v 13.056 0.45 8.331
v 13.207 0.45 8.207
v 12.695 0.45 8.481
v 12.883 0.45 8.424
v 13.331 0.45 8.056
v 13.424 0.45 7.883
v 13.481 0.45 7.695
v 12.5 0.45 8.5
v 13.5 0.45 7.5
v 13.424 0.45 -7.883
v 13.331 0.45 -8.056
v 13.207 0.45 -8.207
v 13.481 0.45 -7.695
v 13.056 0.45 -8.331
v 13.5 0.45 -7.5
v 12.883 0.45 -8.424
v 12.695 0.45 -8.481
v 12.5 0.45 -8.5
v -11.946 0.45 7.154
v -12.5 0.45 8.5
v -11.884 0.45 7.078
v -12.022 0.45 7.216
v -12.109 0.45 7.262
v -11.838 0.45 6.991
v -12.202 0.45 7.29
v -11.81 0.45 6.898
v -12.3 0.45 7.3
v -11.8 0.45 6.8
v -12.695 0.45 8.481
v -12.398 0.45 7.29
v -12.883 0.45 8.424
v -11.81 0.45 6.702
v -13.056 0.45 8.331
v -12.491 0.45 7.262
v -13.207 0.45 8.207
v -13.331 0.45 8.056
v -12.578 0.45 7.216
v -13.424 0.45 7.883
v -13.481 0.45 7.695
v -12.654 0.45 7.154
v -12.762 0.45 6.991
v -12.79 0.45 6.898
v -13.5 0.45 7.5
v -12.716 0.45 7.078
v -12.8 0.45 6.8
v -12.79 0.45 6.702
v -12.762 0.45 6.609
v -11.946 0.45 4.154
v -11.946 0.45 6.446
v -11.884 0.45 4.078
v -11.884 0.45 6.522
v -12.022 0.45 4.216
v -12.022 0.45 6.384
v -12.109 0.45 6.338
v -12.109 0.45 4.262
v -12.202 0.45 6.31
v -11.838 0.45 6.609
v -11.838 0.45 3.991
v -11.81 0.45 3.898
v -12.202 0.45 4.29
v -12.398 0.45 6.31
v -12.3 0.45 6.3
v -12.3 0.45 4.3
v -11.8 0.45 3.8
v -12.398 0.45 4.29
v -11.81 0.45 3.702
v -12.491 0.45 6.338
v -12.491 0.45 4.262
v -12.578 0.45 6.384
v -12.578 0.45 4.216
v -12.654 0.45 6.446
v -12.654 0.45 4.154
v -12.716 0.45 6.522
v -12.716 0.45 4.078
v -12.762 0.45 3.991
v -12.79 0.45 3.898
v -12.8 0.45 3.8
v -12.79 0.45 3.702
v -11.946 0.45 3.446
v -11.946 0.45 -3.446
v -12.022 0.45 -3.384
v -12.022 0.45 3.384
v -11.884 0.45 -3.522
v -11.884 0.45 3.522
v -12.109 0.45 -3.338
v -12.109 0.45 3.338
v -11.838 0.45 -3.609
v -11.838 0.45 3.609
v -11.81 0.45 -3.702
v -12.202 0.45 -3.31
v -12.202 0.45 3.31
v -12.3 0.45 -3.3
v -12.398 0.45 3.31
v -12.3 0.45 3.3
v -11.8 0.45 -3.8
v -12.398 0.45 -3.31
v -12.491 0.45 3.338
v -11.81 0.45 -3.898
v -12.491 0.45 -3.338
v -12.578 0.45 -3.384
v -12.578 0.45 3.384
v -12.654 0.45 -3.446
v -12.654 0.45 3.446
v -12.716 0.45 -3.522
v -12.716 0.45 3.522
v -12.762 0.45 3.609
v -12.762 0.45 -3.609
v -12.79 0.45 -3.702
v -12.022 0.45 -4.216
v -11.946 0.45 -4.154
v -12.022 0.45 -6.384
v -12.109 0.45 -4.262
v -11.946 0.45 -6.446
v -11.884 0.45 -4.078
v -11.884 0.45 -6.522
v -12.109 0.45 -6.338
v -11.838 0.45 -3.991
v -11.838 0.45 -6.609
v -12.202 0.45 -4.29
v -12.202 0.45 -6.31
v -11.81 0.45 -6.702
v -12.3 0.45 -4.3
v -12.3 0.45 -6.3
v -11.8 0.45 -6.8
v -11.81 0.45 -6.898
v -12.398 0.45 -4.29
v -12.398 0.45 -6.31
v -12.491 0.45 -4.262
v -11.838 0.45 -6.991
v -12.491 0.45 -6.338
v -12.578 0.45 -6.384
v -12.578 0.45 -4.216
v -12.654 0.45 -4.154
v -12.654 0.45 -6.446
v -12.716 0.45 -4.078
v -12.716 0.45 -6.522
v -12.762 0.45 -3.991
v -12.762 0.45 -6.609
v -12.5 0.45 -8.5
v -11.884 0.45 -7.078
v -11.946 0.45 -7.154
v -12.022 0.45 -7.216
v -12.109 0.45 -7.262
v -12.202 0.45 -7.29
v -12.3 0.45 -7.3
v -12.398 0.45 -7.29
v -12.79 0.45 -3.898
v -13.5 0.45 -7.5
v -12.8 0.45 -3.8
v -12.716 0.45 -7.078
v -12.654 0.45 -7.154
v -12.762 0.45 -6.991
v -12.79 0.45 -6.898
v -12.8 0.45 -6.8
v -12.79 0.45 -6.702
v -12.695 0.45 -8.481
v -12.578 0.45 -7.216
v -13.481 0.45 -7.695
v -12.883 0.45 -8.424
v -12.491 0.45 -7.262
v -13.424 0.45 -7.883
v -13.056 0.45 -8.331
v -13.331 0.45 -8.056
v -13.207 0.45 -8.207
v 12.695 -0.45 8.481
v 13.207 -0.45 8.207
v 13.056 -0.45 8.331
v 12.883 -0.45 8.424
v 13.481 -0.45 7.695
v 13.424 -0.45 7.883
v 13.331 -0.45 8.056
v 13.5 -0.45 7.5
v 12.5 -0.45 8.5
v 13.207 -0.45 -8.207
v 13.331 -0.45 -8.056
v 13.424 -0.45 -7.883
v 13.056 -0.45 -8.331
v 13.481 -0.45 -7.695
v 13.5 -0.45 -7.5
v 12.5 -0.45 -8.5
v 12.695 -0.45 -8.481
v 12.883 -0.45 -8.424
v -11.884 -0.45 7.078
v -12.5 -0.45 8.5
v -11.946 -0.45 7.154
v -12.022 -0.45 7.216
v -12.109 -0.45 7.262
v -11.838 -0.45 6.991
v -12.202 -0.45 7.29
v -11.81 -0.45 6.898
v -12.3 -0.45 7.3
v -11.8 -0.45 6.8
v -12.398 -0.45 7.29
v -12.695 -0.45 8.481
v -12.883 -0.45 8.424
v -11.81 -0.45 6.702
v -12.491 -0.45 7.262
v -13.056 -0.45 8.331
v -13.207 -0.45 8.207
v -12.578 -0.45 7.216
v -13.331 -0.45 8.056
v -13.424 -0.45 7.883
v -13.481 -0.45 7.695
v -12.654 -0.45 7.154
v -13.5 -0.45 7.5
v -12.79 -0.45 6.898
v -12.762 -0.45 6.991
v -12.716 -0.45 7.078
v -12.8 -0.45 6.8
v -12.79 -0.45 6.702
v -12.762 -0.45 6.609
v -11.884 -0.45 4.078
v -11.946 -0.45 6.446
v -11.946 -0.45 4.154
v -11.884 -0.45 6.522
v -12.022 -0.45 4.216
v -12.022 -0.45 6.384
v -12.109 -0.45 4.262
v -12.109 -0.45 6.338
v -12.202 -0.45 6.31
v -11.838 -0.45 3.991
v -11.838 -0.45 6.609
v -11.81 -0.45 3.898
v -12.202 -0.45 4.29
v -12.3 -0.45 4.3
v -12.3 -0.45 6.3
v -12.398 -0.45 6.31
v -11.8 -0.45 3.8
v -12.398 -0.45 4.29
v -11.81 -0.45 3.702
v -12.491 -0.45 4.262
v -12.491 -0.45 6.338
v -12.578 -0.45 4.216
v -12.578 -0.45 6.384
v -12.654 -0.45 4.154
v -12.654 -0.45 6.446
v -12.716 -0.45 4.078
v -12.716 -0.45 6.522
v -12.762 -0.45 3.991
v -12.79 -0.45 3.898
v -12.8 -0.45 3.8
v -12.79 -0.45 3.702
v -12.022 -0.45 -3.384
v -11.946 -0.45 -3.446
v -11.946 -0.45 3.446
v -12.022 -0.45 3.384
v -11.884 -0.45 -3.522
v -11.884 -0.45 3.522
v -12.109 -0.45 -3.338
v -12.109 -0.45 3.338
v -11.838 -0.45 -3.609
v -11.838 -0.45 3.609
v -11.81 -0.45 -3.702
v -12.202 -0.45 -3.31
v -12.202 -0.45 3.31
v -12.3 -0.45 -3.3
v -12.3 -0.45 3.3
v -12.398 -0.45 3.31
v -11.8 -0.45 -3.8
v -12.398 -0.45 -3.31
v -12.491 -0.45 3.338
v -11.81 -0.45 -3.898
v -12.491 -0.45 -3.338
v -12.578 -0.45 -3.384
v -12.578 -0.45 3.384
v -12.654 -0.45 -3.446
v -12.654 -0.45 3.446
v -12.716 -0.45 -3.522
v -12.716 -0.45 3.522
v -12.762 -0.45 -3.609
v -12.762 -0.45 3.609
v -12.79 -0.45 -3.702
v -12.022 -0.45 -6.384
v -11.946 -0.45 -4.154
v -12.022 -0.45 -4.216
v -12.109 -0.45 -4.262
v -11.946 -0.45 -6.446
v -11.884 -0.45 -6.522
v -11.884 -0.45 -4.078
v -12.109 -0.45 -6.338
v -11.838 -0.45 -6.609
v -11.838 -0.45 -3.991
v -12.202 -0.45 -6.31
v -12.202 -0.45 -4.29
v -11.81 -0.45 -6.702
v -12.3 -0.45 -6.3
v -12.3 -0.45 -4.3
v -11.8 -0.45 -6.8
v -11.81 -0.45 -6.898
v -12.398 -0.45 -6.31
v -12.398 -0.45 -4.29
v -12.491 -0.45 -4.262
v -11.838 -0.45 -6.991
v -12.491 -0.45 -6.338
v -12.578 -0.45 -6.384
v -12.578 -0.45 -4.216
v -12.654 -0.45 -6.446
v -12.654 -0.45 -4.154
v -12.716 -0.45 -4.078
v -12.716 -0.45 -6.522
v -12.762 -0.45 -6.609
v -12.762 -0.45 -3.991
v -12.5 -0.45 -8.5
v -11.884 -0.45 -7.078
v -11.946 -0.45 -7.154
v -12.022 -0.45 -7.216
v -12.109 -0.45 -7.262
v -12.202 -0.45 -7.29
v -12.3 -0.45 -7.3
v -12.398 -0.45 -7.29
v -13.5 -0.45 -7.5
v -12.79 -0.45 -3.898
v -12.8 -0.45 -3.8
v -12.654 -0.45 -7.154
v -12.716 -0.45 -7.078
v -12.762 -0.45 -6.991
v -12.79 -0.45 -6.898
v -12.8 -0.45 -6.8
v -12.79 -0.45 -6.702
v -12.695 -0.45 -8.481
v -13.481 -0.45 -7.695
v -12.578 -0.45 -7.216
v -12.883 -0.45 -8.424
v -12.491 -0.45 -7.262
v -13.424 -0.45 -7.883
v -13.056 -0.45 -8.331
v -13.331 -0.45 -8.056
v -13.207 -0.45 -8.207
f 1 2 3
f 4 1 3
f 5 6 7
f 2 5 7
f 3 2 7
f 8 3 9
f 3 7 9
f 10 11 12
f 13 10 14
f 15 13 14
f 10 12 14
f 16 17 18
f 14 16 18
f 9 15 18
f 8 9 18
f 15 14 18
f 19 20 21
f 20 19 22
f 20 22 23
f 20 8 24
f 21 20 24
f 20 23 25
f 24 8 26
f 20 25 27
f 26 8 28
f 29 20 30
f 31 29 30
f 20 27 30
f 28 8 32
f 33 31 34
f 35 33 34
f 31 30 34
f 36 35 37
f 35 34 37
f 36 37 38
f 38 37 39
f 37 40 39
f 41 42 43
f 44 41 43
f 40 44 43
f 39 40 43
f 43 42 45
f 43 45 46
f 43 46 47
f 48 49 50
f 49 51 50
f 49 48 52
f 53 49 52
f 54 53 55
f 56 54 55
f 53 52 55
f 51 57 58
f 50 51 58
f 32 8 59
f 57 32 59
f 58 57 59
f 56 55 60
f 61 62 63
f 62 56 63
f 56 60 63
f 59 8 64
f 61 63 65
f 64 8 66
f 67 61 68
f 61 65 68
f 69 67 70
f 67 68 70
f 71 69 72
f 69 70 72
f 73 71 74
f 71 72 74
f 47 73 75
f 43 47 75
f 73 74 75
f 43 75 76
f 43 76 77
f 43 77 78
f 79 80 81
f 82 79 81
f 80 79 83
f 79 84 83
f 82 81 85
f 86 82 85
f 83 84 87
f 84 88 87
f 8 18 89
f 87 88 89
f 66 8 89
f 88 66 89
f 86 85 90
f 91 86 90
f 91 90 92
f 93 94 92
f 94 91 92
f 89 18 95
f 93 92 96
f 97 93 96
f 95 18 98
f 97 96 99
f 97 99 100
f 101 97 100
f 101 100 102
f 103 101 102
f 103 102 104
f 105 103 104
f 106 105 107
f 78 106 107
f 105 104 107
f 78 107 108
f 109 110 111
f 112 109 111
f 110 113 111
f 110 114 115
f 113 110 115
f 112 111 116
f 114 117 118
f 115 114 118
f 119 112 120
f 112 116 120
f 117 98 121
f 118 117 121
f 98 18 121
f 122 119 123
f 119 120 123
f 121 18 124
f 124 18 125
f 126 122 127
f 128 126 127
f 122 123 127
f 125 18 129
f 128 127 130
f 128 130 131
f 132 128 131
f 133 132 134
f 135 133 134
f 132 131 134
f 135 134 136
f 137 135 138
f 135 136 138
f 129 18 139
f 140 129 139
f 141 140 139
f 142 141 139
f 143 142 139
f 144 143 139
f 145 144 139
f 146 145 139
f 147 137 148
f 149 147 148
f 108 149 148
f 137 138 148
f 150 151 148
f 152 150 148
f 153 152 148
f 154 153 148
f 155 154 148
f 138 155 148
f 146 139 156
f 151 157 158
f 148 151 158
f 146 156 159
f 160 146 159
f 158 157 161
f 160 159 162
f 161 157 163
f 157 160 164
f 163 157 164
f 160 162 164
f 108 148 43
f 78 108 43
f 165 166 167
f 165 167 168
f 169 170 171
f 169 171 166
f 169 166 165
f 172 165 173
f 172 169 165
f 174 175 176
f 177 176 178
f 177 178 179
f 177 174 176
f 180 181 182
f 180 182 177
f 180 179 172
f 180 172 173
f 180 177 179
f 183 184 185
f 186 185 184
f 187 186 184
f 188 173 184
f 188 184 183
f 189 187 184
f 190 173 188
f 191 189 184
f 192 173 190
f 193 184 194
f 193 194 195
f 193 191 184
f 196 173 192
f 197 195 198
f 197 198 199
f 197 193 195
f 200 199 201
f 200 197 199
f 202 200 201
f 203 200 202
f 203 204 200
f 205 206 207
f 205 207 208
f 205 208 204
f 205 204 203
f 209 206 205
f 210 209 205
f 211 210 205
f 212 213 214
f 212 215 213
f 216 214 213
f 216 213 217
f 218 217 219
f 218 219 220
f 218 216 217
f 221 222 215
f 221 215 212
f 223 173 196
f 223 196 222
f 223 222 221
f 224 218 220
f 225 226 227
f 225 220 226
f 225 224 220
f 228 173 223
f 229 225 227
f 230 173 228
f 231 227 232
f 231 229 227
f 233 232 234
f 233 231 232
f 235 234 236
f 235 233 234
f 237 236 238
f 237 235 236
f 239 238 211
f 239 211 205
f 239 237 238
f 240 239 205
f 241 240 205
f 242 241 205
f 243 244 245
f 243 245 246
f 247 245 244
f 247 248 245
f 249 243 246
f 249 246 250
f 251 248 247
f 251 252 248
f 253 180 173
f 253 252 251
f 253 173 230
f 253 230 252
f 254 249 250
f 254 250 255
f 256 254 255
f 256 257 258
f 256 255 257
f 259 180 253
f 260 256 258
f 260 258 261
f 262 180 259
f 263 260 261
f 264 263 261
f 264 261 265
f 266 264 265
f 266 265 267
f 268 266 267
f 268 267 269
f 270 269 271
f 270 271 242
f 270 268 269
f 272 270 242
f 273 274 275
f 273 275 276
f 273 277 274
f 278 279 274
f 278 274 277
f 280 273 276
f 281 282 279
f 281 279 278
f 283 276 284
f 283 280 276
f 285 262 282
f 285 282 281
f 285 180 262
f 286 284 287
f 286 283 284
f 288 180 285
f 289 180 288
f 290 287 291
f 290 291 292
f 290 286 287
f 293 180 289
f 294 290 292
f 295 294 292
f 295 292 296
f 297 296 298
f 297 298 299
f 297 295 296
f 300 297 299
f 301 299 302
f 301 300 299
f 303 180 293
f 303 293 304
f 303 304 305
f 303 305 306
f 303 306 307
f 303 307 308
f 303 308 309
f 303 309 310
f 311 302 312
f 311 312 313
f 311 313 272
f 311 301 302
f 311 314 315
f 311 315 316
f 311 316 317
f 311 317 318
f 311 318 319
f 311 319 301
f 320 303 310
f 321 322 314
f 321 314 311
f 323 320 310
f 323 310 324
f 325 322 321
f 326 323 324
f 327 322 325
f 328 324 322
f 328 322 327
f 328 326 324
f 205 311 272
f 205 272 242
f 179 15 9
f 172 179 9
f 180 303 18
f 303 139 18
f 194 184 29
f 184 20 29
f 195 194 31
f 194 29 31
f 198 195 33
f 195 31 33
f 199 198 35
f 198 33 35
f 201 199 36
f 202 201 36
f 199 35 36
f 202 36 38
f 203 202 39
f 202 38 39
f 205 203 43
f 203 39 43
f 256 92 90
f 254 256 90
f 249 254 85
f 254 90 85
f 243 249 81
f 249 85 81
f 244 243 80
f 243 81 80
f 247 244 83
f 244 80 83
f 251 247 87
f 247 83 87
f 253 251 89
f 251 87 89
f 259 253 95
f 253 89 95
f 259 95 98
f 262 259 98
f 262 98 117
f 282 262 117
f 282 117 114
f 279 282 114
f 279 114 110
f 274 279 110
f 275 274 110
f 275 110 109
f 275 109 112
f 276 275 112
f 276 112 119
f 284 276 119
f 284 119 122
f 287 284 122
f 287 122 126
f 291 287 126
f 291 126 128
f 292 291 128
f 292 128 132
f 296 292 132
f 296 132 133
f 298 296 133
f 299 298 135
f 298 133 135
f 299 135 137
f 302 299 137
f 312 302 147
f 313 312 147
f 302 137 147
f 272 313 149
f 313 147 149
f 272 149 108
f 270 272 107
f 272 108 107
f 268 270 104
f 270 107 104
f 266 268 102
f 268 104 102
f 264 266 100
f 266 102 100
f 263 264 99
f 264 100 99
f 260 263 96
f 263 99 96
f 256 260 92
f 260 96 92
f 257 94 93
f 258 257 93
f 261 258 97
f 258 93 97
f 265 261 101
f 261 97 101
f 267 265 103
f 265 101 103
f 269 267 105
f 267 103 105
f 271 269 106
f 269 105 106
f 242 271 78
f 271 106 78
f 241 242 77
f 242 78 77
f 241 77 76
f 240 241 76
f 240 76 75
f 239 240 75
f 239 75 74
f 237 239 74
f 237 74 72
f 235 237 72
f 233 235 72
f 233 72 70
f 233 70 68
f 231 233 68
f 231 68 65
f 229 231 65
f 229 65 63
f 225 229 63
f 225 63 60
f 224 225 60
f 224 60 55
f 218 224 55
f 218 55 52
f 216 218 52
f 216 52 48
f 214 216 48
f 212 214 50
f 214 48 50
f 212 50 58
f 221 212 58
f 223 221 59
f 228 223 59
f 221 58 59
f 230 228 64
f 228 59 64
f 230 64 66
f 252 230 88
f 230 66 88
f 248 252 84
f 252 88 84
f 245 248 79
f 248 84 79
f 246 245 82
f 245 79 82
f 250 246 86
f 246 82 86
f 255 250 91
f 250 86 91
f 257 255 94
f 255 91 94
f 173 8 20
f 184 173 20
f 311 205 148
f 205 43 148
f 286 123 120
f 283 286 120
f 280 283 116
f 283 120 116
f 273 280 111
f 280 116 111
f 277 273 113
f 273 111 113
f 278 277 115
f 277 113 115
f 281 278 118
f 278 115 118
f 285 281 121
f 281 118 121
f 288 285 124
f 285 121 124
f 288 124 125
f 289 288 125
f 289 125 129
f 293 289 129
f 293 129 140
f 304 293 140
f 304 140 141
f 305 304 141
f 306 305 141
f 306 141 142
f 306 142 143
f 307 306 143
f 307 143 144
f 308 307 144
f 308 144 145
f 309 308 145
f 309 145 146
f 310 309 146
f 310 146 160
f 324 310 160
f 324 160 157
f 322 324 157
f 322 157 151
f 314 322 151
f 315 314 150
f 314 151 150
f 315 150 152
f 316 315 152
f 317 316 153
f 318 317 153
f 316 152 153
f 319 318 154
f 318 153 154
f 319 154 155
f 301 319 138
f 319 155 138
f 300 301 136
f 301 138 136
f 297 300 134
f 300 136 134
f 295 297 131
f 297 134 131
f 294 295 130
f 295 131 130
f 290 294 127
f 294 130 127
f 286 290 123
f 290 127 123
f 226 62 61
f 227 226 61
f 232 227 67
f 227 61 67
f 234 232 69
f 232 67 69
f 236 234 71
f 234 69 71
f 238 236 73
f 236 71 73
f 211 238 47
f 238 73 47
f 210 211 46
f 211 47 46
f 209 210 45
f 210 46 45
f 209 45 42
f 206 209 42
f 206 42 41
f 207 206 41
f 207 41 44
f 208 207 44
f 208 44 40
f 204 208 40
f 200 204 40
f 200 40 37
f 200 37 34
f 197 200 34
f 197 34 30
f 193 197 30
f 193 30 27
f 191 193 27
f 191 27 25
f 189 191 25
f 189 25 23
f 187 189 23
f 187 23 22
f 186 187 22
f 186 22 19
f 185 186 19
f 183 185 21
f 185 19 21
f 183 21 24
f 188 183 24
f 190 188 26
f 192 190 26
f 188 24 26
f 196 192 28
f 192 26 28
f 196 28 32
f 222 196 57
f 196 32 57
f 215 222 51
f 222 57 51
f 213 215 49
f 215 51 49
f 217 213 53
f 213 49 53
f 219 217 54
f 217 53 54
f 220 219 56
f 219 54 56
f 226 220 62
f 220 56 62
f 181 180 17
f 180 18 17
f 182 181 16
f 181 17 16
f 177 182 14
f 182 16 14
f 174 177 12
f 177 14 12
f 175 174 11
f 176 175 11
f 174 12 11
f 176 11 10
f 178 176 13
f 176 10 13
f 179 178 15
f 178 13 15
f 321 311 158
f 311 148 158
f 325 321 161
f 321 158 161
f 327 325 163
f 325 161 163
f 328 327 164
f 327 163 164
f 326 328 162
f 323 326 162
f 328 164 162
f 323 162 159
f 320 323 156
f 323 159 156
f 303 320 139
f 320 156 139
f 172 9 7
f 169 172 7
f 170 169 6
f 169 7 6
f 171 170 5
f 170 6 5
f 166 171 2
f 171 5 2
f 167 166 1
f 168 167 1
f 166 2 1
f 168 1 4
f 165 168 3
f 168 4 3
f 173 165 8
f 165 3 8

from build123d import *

# Parameters (mm, degrees)
RESSALTO_EXTRUS_O1_DEPTH = 0.45
ESBO_O2_R                = 0.5
CORTE_EXTRUS_O1_DEPTH    = 16.978422951


with BuildPart() as part:
    # Esboço1 → Ressalto-extrusão1 (new, symmetric)
    with BuildSketch(Plane(origin=(0, 0, 0), x_dir=(1, 0, 0), z_dir=(0, 1, 0))):
        with BuildLine():
            Line((12.5, -8.5), (-12.5, -8.5))
            ThreePointArc((-12.5, -8.5), (-13.207106781, -8.207106781), (-13.5, -7.5))
            Line((-13.5, -7.5), (-13.5, 7.5))
            ThreePointArc((-13.5, 7.5), (-13.207106781, 8.207106781), (-12.5, 8.5))
            Line((-12.5, 8.5), (12.5, 8.5))
            ThreePointArc((12.5, 8.5), (13.207106781, 8.207106781), (13.5, 7.5))
            Line((13.5, 7.5), (13.5, -7.5))
            ThreePointArc((13.5, -7.5), (13.207106781, -8.207106781), (12.5, -8.5))
        make_face()
    extrude(amount=RESSALTO_EXTRUS_O1_DEPTH, both=True)

    # Esboço2 → Corte-extrusão1 (cut, through all)
    with BuildSketch(Plane(origin=(0, 0.45, 0), x_dir=(1, 0, 0), z_dir=(0, 1, 0))):
        with Locations(Location((-12.3, 3.8, 0), (0, 0, 270))):
            Circle(ESBO_O2_R)
        with Locations(Location((-12.3, 6.8, 0), (0, 0, 270))):
            Circle(ESBO_O2_R)
        with Locations(Location((-12.3, -6.8, 0), (0, 0, 90))):
            Circle(ESBO_O2_R)
        with Locations(Location((-12.3, -3.8, 0), (0, 0, 90))):
            Circle(ESBO_O2_R)
    extrude(amount=-CORTE_EXTRUS_O1_DEPTH, mode=Mode.SUBTRACT)


solid = part.part
